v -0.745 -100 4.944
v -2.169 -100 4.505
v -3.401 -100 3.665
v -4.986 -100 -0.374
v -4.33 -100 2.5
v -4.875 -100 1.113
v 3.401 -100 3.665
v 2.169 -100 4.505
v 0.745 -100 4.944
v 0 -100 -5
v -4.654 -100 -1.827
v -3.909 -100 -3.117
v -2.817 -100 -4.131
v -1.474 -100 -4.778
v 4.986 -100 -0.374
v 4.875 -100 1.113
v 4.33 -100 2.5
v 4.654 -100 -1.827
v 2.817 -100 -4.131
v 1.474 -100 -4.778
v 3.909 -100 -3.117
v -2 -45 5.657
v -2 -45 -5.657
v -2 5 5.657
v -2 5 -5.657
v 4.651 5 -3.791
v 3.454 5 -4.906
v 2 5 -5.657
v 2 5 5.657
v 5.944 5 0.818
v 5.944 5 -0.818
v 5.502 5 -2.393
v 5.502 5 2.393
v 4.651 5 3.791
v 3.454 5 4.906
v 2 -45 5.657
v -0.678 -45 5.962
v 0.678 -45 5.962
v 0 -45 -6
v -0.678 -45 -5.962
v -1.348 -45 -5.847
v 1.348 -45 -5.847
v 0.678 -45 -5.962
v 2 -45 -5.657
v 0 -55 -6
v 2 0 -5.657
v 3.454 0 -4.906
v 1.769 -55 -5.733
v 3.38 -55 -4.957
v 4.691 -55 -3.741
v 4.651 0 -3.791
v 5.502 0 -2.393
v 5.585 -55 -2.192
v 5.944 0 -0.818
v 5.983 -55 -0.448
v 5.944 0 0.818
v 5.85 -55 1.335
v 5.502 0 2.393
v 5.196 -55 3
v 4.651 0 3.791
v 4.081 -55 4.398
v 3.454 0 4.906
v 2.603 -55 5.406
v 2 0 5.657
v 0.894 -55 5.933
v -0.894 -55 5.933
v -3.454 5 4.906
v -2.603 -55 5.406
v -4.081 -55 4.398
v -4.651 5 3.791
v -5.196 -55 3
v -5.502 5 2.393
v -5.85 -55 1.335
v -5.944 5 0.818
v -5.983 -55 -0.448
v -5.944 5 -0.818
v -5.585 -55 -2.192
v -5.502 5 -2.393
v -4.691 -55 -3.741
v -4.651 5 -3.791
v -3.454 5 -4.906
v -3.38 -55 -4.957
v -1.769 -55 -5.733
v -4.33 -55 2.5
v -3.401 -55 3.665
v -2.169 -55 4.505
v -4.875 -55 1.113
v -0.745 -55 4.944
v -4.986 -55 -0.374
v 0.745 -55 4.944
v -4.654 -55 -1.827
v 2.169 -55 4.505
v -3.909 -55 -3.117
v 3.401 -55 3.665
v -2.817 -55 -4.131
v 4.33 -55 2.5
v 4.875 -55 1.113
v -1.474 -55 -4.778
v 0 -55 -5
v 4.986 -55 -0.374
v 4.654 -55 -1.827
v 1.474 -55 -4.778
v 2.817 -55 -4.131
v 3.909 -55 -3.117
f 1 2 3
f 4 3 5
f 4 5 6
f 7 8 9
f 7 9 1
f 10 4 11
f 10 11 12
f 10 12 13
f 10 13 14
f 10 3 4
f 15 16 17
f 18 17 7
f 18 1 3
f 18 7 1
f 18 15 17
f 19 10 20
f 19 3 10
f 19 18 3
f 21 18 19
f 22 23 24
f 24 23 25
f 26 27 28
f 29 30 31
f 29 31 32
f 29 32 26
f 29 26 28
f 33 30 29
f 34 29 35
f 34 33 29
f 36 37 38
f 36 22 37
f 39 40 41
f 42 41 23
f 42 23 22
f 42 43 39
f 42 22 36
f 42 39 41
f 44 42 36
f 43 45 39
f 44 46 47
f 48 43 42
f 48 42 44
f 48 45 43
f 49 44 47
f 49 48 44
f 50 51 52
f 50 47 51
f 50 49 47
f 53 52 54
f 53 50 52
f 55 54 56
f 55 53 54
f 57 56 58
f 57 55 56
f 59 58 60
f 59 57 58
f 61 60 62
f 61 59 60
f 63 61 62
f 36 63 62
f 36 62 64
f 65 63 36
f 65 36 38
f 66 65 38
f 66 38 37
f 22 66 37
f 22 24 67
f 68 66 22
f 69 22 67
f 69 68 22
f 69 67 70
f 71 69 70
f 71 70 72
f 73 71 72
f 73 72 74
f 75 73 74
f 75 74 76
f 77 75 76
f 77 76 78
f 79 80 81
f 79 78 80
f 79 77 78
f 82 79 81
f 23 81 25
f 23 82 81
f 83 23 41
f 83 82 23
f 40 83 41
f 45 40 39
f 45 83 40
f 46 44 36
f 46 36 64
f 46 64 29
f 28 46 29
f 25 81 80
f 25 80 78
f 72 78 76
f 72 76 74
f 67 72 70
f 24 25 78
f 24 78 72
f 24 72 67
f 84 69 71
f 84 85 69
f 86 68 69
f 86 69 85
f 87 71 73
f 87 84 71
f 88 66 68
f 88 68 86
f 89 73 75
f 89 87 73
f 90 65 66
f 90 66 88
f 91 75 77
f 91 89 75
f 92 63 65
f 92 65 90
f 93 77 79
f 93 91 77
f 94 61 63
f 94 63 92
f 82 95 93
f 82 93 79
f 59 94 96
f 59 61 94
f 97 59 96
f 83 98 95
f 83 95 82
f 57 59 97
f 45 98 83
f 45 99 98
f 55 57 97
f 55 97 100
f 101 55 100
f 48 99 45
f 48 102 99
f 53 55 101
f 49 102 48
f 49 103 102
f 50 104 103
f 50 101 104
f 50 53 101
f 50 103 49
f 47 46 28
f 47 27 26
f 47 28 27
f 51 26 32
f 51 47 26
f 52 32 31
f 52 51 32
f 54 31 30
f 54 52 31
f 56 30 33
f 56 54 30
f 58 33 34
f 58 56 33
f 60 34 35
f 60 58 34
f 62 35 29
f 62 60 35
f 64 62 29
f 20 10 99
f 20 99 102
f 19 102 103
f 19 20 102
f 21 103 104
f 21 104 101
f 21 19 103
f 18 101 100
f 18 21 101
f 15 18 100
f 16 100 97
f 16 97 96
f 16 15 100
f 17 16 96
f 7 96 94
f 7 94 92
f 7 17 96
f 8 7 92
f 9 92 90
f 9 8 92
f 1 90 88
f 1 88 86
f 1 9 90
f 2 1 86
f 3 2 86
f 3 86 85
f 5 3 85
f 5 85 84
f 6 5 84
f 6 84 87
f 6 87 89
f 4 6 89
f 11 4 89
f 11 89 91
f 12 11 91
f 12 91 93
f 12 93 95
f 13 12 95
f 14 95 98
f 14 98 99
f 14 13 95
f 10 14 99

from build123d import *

# Parameters (mm, degrees)
SKETCH1_R               = 6
BOSS_EXTRUDE1_DEPTH     = 5
BOSS_EXTRUDE2_START     = 100
SKETCH2_R               = 6
BOSS_EXTRUDE2_DEPTH     = 100
CUT_EXTRUDE1_DEPTH      = 101.359354322
CUT_EXTRUDE1_DEPTH_BACK = 101.359354322
SKETCH3_W               = 4
SKETCH3_H               = 50
SKETCH4_R               = 6
SKETCH4_R_2             = 5
CUT_EXTRUDE2_DEPTH      = 45


with BuildPart() as part:
    # Sketch1 → Boss-Extrude1 (new body)
    with BuildSketch(Plane(origin=(0, 0, 0), x_dir=(1, 0, 0), z_dir=(0, 1, 0))):
        with Locations(Location((0, 0, 0), (0, 0, 270))):
            Circle(SKETCH1_R)
    extrude(amount=BOSS_EXTRUDE1_DEPTH)

    # Sketch2 → Boss-Extrude2 (add)
    with BuildSketch(Plane.XZ.offset(BOSS_EXTRUDE2_START)):
        with Locations(Location((0, 0, 0), (0, 0, 270))):
            Circle(SKETCH2_R)
    extrude(amount=-BOSS_EXTRUDE2_DEPTH)

    # Sketch3 → Cut-Extrude1 (cut, two sides: drawn at the far end of the back side and taken through both)
    with BuildSketch(Plane.XY.offset(-CUT_EXTRUDE1_DEPTH_BACK)):
        with Locations((0, -20)):
            Rectangle(SKETCH3_W, SKETCH3_H)
    extrude(amount=CUT_EXTRUDE1_DEPTH + CUT_EXTRUDE1_DEPTH_BACK, mode=Mode.SUBTRACT)

    # Sketch4 → Cut-Extrude2 (cut)
    with BuildSketch(Plane.XZ.offset(100)):
        with Locations(Location((0, 0, 0), (0, 0, 270))):
            Circle(SKETCH4_R)
        with Locations(Location((0, 0, 0), (0, 0, 270))):
            Circle(SKETCH4_R_2, mode=Mode.SUBTRACT)
    extrude(amount=-CUT_EXTRUDE2_DEPTH, mode=Mode.SUBTRACT)


solid = part.part
